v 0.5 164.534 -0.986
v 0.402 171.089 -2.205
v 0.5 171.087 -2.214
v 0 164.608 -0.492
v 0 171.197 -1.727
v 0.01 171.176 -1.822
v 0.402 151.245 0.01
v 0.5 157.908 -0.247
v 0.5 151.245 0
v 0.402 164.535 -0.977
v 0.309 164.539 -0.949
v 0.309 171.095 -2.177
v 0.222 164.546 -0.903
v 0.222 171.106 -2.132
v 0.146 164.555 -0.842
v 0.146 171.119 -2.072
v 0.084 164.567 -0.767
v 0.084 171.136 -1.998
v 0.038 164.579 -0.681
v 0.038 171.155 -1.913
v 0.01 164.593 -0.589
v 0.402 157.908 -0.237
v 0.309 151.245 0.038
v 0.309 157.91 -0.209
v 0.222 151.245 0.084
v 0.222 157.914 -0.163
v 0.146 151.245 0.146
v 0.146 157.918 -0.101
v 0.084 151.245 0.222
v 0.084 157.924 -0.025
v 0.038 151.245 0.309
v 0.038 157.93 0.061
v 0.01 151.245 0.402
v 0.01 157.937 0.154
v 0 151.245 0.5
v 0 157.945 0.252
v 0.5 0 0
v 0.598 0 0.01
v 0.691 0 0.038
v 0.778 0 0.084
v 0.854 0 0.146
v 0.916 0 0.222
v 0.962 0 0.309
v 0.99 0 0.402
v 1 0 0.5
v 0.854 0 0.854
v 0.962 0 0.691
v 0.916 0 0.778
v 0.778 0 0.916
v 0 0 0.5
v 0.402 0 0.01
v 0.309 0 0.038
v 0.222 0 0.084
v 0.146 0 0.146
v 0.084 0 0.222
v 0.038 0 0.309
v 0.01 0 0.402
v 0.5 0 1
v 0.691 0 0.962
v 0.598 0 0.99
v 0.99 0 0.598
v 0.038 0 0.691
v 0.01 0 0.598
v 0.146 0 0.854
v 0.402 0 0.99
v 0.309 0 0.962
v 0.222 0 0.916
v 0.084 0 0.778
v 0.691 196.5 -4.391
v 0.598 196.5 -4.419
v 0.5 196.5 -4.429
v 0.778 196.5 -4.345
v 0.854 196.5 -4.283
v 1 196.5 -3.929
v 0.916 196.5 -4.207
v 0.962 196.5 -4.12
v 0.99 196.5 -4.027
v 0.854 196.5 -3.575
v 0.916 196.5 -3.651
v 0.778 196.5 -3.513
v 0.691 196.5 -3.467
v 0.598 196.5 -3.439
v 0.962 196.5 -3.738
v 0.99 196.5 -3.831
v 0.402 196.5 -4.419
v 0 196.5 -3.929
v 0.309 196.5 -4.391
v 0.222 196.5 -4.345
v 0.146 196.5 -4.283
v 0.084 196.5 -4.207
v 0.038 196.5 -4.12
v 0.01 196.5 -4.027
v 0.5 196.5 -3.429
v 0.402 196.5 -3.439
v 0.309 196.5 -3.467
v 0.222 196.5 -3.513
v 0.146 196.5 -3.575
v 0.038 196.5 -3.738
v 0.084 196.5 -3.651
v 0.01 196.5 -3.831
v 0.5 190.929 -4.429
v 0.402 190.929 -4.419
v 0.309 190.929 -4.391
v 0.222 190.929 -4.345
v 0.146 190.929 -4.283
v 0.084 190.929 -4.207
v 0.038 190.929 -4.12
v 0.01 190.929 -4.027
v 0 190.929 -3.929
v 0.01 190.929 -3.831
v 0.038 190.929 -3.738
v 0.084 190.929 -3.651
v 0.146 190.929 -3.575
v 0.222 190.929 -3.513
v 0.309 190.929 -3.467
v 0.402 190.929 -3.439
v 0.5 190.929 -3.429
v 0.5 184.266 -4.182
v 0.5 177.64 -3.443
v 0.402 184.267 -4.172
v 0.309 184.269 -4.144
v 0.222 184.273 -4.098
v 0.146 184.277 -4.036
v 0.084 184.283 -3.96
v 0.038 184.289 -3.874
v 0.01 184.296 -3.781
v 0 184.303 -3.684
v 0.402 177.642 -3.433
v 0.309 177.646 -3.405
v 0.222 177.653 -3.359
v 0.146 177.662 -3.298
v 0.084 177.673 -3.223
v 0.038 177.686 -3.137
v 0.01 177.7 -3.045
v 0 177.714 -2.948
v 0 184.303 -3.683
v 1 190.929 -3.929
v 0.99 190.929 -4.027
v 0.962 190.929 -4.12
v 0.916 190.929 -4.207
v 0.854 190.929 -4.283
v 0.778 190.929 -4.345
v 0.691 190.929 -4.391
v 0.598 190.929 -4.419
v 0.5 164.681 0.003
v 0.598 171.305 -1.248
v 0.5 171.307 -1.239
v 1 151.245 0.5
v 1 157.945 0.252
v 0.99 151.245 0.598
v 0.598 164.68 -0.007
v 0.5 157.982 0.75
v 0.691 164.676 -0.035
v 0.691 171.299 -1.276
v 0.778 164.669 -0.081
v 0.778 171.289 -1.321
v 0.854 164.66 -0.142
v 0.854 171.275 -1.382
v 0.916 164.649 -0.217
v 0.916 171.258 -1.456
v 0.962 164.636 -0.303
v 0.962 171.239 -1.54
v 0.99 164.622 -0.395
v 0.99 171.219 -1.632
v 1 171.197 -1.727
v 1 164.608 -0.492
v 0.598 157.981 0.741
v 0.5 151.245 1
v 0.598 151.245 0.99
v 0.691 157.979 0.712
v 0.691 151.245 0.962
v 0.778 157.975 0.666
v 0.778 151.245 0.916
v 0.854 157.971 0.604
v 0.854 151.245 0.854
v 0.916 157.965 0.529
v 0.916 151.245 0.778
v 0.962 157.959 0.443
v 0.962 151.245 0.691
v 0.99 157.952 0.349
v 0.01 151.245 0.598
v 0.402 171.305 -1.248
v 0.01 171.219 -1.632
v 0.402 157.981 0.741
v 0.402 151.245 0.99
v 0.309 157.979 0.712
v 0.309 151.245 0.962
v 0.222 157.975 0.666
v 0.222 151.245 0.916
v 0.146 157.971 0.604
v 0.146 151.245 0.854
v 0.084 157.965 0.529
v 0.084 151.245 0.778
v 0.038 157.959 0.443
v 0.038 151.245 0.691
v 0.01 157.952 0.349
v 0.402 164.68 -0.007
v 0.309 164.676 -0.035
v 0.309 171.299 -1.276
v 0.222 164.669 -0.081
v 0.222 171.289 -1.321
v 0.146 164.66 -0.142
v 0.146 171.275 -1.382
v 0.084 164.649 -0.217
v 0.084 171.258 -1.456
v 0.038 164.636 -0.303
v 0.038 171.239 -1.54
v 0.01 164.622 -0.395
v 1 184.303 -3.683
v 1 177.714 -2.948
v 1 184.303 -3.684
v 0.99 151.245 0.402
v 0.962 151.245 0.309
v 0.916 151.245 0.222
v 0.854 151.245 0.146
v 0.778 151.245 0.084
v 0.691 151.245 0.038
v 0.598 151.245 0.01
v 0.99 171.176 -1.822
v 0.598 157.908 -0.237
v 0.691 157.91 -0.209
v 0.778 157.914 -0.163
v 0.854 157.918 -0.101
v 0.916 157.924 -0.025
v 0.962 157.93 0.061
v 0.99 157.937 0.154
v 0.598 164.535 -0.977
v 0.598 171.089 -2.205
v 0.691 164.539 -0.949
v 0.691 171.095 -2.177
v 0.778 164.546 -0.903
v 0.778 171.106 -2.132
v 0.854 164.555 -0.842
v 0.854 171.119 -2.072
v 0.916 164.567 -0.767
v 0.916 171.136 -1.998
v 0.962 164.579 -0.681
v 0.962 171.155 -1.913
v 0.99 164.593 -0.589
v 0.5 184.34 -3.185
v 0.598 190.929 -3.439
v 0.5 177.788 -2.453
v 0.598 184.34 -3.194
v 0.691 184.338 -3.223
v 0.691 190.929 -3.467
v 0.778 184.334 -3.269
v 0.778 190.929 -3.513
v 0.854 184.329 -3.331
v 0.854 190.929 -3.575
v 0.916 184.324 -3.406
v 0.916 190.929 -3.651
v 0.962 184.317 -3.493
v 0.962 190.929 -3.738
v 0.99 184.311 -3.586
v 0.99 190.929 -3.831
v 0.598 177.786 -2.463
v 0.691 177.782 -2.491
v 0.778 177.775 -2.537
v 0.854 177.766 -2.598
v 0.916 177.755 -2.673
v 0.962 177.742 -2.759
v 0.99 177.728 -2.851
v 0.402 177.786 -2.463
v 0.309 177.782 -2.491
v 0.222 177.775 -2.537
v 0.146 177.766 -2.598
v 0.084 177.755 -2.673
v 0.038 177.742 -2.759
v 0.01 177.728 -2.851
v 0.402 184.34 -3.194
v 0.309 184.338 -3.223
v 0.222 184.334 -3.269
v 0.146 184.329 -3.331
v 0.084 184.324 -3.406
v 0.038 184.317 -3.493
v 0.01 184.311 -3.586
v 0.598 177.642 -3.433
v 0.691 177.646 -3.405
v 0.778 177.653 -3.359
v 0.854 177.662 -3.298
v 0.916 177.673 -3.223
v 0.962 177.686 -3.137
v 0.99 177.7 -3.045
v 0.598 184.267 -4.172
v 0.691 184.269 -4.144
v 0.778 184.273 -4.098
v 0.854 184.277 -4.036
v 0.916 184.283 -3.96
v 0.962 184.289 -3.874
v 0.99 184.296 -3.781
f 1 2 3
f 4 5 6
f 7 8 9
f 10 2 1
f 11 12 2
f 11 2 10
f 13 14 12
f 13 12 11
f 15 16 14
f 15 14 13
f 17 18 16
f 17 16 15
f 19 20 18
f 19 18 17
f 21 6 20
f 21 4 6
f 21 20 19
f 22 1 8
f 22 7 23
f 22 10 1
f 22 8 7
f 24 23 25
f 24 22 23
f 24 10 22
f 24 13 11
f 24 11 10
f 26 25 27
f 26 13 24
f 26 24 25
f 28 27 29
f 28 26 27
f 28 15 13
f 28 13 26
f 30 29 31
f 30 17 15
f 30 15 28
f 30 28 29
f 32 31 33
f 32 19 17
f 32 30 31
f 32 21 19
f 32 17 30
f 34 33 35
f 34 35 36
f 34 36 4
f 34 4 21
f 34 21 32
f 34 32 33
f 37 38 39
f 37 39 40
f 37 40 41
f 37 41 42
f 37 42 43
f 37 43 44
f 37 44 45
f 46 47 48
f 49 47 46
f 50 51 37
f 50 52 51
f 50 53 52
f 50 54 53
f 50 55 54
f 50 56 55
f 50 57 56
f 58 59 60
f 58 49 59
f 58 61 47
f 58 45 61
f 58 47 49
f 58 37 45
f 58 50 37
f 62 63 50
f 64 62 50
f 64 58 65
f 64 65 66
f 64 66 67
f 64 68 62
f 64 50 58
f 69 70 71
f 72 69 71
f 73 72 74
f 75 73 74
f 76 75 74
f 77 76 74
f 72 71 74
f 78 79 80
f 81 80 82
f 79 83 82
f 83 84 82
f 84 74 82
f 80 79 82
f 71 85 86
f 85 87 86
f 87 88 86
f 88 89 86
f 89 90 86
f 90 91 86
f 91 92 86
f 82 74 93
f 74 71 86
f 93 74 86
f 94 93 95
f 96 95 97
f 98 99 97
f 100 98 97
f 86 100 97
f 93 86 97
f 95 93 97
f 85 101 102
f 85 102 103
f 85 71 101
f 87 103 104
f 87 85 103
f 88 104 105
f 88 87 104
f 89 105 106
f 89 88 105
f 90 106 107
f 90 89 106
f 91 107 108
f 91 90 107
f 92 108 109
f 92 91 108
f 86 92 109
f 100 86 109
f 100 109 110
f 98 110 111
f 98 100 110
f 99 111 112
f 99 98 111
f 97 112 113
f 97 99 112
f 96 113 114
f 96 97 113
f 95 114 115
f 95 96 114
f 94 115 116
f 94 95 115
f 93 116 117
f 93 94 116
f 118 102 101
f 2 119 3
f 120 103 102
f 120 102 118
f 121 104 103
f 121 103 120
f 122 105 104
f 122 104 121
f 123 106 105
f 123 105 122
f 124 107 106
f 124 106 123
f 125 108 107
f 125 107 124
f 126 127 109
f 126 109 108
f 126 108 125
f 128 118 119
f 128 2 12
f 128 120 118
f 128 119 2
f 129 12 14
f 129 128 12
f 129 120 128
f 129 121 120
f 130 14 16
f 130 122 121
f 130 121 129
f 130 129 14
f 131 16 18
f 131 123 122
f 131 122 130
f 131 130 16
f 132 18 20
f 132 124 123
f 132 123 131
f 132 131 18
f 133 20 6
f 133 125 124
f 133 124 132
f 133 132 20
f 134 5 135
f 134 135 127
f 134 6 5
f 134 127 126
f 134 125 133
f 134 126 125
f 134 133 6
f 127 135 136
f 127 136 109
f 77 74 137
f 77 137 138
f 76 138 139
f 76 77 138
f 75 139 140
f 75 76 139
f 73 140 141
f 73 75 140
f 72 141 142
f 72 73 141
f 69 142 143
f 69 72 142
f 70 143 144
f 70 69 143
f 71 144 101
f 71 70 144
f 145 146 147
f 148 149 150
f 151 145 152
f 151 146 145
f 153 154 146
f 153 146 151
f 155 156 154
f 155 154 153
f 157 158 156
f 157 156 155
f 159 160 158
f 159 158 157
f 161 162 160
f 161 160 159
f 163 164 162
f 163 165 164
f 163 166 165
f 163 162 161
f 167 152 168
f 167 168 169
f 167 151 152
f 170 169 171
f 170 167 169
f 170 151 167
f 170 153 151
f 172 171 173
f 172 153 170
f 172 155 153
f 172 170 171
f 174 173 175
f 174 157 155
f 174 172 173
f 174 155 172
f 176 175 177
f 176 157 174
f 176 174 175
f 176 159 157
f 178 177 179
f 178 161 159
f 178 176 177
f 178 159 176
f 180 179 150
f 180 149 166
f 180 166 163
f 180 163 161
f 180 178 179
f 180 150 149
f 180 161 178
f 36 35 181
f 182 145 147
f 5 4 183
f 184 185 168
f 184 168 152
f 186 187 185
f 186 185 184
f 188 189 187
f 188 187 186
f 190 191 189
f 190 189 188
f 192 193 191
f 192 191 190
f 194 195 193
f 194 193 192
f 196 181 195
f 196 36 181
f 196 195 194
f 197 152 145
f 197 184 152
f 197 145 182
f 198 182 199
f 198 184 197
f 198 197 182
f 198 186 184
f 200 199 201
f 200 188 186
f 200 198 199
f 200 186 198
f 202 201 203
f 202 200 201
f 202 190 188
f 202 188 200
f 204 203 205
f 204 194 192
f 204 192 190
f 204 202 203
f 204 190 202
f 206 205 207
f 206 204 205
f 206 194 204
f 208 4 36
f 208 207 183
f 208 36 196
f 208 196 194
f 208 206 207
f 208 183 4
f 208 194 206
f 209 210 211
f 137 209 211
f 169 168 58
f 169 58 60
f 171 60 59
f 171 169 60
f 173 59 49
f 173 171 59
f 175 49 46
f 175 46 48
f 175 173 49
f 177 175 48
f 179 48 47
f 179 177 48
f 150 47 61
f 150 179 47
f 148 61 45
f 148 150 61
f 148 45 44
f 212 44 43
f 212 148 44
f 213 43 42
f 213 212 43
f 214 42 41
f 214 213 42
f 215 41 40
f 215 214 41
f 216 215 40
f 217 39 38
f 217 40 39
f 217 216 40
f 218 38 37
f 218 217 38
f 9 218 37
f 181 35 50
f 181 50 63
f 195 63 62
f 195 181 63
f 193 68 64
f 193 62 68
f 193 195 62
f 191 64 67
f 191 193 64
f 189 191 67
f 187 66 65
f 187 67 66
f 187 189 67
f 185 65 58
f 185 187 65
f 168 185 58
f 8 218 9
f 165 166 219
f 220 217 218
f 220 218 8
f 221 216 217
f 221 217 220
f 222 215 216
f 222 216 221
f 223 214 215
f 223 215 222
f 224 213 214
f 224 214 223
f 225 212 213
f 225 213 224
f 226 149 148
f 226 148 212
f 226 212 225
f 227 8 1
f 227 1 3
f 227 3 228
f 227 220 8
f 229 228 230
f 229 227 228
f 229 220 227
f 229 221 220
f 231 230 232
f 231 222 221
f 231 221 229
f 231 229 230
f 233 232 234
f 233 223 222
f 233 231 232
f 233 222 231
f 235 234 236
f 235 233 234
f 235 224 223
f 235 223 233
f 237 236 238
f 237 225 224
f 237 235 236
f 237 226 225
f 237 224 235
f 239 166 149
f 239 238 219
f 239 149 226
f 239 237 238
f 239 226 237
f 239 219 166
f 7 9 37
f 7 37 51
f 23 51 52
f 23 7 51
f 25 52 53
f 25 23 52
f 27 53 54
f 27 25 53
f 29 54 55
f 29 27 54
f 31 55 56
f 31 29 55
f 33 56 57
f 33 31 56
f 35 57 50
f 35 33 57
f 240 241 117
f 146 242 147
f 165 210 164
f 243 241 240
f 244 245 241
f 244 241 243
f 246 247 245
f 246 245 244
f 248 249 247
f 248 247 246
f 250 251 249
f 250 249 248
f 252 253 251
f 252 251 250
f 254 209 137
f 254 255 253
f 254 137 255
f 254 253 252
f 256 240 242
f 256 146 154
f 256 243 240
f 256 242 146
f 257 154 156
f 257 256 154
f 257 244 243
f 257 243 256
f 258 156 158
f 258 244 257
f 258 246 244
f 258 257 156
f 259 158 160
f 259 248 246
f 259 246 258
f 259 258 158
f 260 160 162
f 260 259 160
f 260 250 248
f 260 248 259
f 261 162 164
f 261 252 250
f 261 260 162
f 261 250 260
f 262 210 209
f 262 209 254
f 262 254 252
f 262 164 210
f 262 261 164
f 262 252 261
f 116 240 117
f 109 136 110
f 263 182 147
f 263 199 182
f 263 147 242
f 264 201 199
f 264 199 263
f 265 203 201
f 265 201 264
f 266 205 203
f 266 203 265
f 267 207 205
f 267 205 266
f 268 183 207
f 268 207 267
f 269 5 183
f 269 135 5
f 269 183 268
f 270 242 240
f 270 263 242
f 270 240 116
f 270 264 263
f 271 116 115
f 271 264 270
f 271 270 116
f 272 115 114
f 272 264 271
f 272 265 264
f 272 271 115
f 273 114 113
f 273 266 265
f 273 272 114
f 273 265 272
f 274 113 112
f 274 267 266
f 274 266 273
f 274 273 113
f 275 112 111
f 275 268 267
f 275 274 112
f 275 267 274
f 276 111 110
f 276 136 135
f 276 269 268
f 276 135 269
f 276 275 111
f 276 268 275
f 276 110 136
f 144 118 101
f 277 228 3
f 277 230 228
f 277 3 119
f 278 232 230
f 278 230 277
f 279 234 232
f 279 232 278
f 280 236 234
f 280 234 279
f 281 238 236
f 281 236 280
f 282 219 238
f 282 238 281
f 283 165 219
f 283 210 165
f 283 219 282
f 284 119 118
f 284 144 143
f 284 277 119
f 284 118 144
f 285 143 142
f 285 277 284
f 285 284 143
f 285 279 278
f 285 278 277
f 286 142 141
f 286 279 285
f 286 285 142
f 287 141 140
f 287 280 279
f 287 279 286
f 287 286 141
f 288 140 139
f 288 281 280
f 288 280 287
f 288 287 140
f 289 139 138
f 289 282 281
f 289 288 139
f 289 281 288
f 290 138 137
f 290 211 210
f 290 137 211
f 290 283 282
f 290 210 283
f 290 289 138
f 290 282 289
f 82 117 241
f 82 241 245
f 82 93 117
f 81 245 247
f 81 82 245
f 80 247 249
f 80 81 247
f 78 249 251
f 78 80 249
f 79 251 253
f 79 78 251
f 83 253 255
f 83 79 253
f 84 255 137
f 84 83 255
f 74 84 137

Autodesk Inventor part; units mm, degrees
ref_plane "YZ Plane" through (0, 0, 0) normal (1, 0, 0) x (0, 1, 0)
ref_plane "XZ Plane" through (0, 0, 0) normal (0, 1, 0) x (-1, 0, 0)
ref_plane "XY Plane" through (0, 0, 0) normal (0, 0, 1) x (1, 0, 0)
sketch "Sketch3" plane through (0, 0, 0) normal (1, 0, 0) x (0, 1, 0)
  line L0 (0, 0) -> (151.2449, 0)
  arc A0 (171.087, -2.2145) -> (151.2449, 0) centre (151.2449, -90) ccw
  arc A1 (171.087, -2.2145) -> (190.929, -4.429) centre (190.929, 85.571) ccw
  line L1 (190.929, -4.429) -> (196.5, -4.429)
  line L2 (0, 1) -> (151.2449, 1)
  arc A2 (171.3074, -1.2391) -> (151.2449, 1) centre (151.2449, -90) ccw
  arc A3 (171.3074, -1.2391) -> (190.929, -3.429) centre (190.929, 85.571) ccw
  line L3 (190.929, -3.429) -> (196.5, -3.429)
  line L4 (196.5, -4.429) -> (196.5, -3.429)
  line L5 (0, 0) -> (0, 1)
  dimension "d42" = 90
  dimension "d43" = 90
  dimension "d44" = 4.429
  dimension "d45" = 5.571
  dimension "d46" = 1
  dimension "d50" = 196.5
extrude "fiberBase" add sketch "Sketch3" along normal blind 1
fillet "round" radius 0.5 16 edges at (1, 181.0573, -2.8798) (1, 161.3385, 0.4385) (1, 75.6225, 1) (1, 193.7145, -3.429) (0, 181.0573, -2.8798) (0, 161.3385, 0.4385) (0, 75.6225, 1) (0, 193.7145, -3.429) (0, 180.9464, -3.8737) (0, 161.2276, -0.5553) (0, 75.6225, 0) (0, 193.7145, -4.429) (1, 180.9464, -3.8737) (1, 161.2276, -0.5553) (1, 75.6225, 0) (1, 193.7145, -4.429)
equation "\"d42\" = curvatureRadius"
equation "\"d43\" = curvatureRadius"
equation "\"d44\" = deepTrackDepth - shallowTrackDepth"
equation "\"d45\" = deepTrackDepth"
equation "\"d46\" = opticalFiberDiameter"
equation "\"d50\" = -scintillatorEdgeClearence + scintillatorHeight - 0.5 * opticalFiberDiameter"
equation "\"d47\" = opticalFiberDiameter"
equation "\"d49\" = 0.5 * opticalFiberDiameter"
equation "\"OpticalFiberDiameter\" = 1"
equation "\"OpticalFiberClearence\" = 0.071"
equation "\"ScintillatorEdgeClearence\" = 3"
equation "\"MPPCDepth\" = 1"
equation "\"LoopLargeTrackRatio\" = 1.1"
equation "\"d24\" = 0.05"
equation "\"d25\" = 1"
equation "\"d32\" = 0.05"
equation "\"d33\" = 1"
equation "\"FiberSensorClerence\" = 0.5"
equation "\"SmallTrackDiameter\" = 175"
equation "\"ShallowTrackDepth\" = 1.142"
equation "\"MPPCClearence\" = 0.075"
equation "\"MPPCSensorClearence\" = 1.45"
equation "\"MPPCSensorOffsett\" = 2.105"
equation "\"MPPCWidth\" = 5.9"
equation "\"MPPCHeight\" = 6.55"
equation "\"FiberEdgeOffsett\" = 5"
equation "\"LongFiberAngle\" = 30deg"
equation "\"ShortFiberAngle\" = 78deg"
equation "\"MountingScrewOffsett\" = 9"
equation "\"MountingScrewDepth\" = 4"
equation "\"DeepTrackDepth\" = 5.571"
equation "\"FoilThickness\" = 0.2"
equation "\"silveringThickness\" = 0.2"
equation "\"mppcMountDepth\" = 6.35"
equation "\"curvatureRadius\" = 90"
equation "\"shallowTrackDepth\" = 1.142"
equation "\"deepTrackDepth\" = 5.571"
equation "\"fiberEdgeOffsett\" = 5"
equation "\"scintillatorEdgeClearence\" = 3"
equation "\"opticalFiberDiameter\" = 1"
equation "\"opticalFiberClearence\" = 0.071"
equation "\"scintillatorHeight\" = 200"
properties part number "Fiber Loop" material "Glass"
